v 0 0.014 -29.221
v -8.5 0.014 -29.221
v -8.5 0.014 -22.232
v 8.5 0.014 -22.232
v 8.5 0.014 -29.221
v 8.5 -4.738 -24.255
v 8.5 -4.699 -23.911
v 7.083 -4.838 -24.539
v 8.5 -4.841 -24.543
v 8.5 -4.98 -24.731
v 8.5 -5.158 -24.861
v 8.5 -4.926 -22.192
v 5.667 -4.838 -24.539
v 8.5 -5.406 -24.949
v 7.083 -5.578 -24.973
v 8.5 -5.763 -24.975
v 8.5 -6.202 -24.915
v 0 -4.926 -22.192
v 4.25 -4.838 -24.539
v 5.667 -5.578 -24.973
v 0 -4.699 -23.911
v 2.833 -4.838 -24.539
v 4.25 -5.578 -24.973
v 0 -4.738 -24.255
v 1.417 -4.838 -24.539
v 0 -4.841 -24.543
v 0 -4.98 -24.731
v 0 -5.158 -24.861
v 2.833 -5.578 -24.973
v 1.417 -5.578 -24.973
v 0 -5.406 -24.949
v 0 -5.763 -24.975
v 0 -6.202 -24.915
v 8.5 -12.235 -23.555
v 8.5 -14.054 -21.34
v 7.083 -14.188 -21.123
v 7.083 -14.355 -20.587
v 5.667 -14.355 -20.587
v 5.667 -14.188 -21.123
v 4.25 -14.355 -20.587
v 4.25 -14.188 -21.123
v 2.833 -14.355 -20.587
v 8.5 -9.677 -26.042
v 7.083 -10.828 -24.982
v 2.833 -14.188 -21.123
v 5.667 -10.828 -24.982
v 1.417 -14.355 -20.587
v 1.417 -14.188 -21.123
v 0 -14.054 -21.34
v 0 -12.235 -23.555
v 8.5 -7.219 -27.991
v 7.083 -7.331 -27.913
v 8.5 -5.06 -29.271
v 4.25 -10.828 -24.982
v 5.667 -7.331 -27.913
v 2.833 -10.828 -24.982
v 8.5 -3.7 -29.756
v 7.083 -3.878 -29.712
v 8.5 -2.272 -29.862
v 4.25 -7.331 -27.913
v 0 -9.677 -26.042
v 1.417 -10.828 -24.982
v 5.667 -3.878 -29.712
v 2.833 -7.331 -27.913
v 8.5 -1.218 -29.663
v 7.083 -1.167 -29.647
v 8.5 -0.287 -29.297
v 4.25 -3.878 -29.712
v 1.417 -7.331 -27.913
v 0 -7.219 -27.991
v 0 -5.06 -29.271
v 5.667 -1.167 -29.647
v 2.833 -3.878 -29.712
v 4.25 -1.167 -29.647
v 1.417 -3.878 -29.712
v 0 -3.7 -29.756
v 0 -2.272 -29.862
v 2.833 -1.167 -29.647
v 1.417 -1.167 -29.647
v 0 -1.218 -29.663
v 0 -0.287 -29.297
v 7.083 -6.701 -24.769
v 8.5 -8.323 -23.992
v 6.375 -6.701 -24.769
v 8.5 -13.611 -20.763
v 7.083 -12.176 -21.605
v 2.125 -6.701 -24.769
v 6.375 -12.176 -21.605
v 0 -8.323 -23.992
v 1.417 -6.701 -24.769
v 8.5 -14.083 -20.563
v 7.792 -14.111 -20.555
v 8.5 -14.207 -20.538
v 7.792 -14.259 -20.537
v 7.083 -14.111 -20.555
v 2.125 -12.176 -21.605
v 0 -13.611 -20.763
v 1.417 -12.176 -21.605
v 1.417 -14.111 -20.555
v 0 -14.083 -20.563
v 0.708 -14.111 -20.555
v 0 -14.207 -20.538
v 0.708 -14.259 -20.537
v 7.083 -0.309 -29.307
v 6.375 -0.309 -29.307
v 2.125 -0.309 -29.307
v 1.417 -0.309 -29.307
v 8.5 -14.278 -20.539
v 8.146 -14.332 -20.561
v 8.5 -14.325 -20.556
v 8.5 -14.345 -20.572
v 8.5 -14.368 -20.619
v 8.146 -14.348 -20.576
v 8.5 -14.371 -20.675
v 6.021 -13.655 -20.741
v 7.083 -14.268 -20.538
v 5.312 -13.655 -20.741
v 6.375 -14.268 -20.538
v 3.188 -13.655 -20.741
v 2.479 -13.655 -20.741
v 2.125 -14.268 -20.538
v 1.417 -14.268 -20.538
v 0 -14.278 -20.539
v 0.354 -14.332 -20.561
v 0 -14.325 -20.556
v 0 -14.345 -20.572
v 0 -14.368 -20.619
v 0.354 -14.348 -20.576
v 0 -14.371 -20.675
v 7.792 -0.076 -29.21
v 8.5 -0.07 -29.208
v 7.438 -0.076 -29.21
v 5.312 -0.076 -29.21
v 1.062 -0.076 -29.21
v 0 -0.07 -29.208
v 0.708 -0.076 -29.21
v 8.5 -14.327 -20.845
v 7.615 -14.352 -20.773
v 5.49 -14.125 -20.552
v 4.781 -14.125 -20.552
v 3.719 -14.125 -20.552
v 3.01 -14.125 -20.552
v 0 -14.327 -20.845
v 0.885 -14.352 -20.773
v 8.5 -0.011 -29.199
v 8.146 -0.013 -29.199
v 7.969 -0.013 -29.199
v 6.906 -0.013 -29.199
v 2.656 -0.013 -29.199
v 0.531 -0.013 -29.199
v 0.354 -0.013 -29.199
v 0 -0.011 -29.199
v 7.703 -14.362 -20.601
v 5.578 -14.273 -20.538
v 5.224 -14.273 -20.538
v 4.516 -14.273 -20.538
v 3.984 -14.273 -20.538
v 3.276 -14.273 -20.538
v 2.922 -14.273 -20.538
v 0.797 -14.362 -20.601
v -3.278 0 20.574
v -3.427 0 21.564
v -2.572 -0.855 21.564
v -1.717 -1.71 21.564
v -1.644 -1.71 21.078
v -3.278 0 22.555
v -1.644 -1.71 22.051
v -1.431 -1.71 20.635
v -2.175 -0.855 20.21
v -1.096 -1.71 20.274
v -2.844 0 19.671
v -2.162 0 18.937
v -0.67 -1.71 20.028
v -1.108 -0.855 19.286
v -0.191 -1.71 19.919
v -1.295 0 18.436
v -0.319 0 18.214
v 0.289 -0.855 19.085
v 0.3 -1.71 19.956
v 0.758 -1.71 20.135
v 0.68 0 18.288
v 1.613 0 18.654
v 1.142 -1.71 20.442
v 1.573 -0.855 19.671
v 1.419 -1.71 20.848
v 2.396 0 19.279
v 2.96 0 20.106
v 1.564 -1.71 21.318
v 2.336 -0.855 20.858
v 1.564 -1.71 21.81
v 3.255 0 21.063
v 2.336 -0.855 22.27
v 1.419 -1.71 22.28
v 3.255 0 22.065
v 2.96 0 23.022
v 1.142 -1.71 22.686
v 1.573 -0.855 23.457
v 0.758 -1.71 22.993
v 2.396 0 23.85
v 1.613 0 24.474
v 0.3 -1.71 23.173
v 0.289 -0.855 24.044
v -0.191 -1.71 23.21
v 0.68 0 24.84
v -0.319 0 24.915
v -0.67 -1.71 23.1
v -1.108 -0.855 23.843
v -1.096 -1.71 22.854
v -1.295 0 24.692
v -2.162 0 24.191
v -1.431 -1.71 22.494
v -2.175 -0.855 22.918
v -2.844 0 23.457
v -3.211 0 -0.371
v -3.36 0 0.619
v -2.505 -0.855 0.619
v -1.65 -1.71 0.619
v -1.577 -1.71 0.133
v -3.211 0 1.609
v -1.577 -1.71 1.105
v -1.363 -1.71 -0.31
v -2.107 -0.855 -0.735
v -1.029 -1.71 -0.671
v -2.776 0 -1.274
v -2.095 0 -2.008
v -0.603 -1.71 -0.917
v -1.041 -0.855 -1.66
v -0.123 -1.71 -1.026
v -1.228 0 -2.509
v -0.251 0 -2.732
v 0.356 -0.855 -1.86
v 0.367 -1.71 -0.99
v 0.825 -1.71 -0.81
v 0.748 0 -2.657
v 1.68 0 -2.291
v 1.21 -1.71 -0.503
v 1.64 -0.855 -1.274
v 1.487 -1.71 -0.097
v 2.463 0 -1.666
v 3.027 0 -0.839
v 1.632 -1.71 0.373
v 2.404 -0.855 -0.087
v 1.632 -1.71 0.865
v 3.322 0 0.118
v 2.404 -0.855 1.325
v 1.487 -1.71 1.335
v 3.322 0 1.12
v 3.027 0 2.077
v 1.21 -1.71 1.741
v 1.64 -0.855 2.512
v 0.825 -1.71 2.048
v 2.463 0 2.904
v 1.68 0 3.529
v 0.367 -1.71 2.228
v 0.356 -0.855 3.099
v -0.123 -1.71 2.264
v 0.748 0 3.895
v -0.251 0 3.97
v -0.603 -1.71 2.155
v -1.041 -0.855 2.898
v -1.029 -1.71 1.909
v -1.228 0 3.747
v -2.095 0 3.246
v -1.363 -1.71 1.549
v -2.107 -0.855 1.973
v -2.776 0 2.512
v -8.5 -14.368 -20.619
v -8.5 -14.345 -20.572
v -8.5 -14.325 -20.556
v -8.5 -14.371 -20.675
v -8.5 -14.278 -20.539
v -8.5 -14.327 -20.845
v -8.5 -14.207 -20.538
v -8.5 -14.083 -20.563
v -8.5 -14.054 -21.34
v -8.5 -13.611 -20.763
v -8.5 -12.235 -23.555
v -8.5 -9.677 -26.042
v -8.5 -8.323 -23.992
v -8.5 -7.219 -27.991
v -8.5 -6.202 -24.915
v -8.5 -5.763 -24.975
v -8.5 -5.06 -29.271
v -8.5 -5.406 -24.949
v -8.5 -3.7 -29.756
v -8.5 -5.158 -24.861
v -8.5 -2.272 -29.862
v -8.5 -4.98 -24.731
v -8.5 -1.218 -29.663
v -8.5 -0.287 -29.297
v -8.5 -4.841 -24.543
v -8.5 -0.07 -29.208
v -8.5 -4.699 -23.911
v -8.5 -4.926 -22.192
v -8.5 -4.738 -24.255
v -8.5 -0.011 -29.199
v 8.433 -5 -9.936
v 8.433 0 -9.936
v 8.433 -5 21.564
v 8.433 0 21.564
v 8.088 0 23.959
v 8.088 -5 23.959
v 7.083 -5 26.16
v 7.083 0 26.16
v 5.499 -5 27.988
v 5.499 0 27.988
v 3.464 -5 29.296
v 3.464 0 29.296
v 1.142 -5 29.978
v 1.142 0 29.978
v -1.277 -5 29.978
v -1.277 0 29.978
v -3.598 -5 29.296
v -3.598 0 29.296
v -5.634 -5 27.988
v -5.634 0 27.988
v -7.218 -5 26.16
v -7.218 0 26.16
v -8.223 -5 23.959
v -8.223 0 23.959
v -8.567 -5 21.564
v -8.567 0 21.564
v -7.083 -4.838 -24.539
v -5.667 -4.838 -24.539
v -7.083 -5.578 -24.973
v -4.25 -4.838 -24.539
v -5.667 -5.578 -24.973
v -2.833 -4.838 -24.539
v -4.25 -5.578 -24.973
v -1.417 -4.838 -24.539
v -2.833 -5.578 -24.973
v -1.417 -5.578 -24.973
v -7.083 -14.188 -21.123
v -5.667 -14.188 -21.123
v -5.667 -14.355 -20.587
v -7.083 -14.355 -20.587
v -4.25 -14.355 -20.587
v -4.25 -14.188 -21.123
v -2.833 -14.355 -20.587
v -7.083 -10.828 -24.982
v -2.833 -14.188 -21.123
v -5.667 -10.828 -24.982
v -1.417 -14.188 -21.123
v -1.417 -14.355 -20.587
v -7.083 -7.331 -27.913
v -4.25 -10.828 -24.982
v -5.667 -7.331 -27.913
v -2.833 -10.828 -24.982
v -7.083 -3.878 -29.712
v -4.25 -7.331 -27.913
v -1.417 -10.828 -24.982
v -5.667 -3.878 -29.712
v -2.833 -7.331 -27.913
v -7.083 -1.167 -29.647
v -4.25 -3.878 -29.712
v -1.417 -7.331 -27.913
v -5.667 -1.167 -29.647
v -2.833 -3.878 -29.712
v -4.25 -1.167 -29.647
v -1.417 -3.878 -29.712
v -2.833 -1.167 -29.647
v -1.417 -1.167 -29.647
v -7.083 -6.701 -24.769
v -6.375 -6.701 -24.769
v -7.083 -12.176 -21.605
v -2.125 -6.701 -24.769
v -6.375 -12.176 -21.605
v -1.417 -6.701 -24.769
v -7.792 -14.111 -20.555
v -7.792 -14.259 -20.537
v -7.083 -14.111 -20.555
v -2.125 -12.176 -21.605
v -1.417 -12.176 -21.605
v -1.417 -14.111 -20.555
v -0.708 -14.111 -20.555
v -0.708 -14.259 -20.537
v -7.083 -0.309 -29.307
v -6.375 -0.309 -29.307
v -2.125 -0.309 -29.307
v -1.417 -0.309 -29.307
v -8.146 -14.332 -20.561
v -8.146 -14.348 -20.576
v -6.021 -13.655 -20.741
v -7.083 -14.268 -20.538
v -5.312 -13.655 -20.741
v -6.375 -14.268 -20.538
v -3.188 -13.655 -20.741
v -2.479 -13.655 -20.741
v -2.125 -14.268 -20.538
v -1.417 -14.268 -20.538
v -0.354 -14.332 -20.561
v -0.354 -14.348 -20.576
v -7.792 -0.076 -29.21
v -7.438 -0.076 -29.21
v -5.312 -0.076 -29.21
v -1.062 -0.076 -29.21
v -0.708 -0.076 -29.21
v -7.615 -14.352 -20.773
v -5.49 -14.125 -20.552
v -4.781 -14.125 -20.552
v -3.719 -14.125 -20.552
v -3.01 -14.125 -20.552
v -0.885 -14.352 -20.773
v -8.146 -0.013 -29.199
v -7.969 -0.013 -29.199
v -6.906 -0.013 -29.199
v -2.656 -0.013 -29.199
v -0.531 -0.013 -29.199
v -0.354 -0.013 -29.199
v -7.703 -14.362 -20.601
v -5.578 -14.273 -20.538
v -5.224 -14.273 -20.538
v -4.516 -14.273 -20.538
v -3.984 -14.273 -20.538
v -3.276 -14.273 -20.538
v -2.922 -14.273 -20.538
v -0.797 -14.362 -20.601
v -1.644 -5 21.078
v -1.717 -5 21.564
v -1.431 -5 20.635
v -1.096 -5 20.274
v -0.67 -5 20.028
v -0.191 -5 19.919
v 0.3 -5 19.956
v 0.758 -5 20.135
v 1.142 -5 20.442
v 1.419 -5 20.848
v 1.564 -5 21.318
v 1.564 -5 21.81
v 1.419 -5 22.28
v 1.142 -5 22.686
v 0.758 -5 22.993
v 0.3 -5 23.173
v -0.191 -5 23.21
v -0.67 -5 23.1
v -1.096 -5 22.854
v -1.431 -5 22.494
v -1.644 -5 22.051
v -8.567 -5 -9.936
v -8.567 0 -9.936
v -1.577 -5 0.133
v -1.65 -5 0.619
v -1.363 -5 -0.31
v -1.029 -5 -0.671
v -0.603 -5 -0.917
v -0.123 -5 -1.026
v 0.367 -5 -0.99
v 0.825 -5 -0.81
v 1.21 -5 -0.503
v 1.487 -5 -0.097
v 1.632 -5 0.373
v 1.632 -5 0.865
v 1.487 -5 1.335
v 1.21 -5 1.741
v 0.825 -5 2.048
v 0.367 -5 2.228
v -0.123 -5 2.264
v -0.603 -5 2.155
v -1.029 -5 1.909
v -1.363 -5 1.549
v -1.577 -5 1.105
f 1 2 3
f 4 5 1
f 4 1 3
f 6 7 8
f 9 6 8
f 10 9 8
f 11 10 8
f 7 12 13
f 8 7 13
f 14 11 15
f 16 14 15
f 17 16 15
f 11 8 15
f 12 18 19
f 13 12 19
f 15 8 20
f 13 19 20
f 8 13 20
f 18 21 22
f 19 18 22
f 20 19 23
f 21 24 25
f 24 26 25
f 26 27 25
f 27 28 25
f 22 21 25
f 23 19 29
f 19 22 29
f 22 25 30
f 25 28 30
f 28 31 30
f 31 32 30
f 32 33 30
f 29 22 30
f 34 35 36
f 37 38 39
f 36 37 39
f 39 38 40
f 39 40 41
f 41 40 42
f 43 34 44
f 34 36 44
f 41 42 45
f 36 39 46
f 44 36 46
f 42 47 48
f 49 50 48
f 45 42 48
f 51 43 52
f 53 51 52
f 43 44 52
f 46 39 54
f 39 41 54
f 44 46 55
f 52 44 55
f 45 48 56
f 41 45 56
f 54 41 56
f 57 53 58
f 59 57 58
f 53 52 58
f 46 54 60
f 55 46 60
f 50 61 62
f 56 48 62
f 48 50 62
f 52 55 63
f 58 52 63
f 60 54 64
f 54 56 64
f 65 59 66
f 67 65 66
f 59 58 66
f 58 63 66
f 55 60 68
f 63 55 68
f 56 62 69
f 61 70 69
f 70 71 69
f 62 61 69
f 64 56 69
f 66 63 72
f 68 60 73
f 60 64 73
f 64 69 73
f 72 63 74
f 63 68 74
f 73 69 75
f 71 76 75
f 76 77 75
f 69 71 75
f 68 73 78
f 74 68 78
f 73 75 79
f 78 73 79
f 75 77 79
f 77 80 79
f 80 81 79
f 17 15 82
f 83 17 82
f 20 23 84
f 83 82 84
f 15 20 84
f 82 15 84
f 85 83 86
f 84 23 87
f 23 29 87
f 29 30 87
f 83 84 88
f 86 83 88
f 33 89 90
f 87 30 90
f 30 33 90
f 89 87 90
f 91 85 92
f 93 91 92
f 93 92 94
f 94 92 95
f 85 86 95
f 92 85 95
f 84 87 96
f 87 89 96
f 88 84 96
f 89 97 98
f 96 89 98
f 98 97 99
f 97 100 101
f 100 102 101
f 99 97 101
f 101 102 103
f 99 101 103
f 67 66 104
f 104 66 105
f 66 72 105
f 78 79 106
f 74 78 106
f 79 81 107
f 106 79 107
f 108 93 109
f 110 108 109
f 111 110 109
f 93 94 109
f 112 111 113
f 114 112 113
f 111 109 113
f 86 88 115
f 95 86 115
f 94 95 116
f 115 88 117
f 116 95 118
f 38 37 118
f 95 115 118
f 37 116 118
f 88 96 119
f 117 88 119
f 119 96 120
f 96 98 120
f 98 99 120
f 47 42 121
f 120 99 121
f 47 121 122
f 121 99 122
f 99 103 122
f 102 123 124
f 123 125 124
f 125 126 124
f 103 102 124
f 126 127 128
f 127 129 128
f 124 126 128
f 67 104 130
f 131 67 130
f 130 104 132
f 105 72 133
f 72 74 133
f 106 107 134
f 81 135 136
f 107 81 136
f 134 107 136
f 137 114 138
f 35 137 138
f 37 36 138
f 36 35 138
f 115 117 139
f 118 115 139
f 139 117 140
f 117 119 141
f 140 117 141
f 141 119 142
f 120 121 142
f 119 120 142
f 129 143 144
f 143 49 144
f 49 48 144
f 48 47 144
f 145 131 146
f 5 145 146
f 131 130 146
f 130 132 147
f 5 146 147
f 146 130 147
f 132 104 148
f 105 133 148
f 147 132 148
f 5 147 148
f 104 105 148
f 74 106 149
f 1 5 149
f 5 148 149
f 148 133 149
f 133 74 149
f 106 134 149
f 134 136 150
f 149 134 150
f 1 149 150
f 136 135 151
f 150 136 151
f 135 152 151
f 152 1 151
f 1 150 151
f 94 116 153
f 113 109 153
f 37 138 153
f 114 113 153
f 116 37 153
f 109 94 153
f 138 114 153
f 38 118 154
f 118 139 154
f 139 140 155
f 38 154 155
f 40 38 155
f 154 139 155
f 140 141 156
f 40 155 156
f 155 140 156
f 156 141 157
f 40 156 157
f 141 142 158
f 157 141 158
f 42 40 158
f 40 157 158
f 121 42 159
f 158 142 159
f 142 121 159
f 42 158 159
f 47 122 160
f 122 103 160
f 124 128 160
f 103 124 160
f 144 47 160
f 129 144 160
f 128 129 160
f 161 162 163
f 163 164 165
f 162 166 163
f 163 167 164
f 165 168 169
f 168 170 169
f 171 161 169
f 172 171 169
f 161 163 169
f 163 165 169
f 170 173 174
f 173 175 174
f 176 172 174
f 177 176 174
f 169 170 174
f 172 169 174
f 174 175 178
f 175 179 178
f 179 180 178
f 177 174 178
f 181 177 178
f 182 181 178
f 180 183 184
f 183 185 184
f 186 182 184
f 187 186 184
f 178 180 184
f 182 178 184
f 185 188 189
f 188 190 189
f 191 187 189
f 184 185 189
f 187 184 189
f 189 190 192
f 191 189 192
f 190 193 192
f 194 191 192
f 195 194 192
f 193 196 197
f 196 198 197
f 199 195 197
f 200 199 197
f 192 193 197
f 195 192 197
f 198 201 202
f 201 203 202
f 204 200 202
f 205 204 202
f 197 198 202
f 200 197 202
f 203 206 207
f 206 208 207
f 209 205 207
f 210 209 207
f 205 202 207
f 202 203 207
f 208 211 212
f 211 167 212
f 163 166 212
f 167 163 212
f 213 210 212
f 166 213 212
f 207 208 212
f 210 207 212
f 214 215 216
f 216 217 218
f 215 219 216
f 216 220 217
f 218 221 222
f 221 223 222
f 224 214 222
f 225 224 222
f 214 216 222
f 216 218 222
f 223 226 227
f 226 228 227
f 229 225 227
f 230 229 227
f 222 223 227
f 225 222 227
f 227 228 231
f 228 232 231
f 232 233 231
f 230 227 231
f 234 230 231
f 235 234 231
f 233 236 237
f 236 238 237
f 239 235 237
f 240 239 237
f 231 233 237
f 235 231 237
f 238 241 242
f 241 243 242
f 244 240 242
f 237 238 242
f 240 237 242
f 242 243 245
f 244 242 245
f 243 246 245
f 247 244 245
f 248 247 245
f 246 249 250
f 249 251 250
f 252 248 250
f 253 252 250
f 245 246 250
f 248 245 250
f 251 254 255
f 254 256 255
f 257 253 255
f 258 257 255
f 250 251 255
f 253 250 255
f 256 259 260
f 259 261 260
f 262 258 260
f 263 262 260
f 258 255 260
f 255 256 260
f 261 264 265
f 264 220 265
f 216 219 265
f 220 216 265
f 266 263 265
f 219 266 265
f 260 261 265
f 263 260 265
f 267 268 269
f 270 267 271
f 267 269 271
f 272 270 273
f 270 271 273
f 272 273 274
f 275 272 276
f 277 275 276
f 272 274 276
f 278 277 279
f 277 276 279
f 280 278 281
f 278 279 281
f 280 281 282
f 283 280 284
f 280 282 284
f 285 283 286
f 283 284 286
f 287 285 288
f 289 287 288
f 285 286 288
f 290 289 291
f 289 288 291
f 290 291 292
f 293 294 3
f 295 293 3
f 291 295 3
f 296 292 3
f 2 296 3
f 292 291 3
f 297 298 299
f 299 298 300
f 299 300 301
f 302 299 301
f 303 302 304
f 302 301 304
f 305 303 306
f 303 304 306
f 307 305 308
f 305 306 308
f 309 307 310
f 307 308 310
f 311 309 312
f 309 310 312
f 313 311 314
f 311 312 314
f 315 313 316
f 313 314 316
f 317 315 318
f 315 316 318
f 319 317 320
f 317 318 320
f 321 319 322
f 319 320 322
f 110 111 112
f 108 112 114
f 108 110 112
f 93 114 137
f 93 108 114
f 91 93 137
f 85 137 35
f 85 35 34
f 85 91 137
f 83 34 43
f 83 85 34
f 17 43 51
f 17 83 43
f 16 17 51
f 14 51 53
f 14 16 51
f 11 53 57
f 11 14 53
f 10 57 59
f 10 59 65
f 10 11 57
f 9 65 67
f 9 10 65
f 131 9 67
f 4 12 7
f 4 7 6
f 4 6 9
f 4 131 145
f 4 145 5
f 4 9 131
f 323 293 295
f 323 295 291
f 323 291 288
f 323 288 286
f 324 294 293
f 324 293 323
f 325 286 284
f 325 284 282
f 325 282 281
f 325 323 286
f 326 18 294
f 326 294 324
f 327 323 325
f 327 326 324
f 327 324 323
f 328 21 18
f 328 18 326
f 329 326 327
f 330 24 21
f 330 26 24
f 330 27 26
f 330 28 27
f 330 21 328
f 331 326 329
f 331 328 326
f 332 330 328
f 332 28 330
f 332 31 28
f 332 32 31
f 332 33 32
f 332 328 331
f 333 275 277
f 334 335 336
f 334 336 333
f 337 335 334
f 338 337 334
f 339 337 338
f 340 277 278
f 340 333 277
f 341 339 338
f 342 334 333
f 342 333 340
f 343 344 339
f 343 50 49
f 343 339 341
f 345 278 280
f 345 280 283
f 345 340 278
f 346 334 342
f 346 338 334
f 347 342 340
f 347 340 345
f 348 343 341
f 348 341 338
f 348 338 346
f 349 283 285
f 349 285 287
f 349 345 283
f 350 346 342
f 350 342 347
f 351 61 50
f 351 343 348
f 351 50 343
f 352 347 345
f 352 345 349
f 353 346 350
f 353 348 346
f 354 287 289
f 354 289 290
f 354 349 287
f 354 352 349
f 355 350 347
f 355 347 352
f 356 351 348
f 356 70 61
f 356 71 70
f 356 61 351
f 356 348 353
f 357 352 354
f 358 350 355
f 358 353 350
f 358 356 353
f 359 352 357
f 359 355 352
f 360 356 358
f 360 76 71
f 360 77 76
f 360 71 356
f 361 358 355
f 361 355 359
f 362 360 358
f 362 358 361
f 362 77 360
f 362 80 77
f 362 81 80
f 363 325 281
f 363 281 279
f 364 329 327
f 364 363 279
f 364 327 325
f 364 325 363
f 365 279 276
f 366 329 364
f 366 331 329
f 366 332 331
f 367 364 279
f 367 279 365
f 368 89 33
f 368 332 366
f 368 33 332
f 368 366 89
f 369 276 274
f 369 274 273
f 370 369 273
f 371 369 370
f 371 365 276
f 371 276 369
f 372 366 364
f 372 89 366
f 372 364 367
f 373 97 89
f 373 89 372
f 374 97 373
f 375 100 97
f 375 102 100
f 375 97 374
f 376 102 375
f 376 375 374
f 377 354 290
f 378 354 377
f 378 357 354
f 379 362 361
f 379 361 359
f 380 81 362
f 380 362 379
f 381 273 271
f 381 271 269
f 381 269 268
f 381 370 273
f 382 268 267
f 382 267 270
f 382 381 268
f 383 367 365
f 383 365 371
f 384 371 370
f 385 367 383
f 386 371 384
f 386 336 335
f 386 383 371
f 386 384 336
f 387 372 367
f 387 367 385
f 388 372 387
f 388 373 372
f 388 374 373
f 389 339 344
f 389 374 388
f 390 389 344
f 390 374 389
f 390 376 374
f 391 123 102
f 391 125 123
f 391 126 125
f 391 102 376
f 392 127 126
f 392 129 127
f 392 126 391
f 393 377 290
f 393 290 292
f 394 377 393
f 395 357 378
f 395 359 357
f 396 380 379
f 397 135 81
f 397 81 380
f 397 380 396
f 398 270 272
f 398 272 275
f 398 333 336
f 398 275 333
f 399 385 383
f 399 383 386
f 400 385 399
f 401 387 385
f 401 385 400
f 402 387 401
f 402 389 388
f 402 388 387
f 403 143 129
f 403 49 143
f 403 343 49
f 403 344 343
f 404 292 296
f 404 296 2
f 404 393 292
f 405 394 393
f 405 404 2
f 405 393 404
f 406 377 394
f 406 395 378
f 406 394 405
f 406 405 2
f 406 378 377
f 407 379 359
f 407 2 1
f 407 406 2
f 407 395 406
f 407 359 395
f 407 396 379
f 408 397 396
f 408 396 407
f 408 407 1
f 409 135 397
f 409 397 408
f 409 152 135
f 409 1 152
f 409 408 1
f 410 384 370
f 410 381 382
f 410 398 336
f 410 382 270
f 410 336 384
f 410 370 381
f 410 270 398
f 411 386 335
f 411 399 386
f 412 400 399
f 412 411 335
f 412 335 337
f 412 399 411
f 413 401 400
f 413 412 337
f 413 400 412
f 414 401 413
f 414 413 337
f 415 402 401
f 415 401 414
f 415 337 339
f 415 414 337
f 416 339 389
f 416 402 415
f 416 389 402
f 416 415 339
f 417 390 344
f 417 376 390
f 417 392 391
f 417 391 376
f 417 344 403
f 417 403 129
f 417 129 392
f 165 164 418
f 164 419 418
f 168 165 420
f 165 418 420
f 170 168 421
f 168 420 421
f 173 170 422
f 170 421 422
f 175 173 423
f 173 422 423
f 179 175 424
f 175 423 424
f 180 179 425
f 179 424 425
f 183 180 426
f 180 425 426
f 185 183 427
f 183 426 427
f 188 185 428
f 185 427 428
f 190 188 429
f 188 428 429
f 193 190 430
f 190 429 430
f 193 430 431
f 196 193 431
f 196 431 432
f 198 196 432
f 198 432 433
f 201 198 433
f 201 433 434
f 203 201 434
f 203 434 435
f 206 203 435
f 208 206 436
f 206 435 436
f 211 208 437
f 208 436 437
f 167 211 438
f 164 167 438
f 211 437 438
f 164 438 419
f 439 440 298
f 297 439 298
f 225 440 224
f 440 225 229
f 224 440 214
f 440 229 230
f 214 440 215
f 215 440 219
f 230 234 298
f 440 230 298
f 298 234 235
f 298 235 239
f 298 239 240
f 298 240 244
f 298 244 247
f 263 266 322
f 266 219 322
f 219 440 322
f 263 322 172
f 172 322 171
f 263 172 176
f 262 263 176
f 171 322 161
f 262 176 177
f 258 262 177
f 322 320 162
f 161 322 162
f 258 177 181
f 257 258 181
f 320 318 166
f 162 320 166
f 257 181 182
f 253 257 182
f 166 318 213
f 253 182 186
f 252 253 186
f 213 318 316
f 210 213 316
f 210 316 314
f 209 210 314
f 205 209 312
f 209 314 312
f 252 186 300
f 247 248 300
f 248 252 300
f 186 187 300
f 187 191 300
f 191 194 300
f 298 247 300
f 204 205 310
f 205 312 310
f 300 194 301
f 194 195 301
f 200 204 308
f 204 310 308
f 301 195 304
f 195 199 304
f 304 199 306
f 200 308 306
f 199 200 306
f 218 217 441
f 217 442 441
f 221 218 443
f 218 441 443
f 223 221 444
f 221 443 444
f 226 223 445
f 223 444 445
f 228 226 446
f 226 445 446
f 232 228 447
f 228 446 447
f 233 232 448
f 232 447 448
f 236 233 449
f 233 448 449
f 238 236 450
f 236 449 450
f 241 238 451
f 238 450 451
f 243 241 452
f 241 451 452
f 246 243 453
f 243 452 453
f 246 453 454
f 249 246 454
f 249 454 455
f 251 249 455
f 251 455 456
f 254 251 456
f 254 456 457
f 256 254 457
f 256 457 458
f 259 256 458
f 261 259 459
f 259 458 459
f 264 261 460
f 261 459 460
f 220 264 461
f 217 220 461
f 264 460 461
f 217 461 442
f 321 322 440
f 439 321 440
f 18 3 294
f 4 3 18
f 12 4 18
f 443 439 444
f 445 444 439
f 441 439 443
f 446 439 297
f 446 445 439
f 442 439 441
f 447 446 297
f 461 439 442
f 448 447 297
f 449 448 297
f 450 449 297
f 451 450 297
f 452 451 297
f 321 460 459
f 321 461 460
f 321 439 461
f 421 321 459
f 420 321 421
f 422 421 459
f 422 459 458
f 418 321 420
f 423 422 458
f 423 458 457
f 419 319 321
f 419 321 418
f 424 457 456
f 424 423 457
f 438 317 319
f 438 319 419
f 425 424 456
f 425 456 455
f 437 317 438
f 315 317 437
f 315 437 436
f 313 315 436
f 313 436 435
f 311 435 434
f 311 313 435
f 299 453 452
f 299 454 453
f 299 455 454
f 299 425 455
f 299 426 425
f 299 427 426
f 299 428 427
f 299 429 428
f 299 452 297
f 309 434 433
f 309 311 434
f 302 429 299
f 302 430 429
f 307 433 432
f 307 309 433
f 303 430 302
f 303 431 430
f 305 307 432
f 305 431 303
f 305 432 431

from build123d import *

# Parameters (mm, degrees)
F1_DEPTH       = 5
F3_DEPTH       = 8.5
F4_D           = 3.3
F4_CSINK_D     = 6.72
F4_CSINK_ANGLE = 90


with BuildPart() as f1:
    # F0 (on Front) → F1 (new body)
    with BuildSketch(Plane.XZ):
        with BuildLine():
            ThreePointArc((8.4325509294, 21.5641788055), (-0.0674490706, 30.0641788055), (-8.5674490706, 21.5641788055))
            Line((-8.5674490706, 21.5641788055), (-8.5674490706, -9.9358211945))
            Line((-8.5674490706, -9.9358211945), (8.4325509294, -9.9358211945))
            Line((8.4325509294, -9.9358211945), (8.4325509294, 21.5641788055))
        make_face()
    extrude(amount=F1_DEPTH)

    # F4 (through all)
    with Locations(Plane(origin=(0, 0, 0), x_dir=(1, 0, 0), z_dir=(0, 1, 0))):
        with Locations((0, -0.6190594286), (-0.0674490706, -21.5641788055)):
            CounterSinkHole(F4_D / 2, F4_CSINK_D / 2, counter_sink_angle=F4_CSINK_ANGLE)


with BuildPart() as f3:
    # F2 (on Right) → F3 (new body, symmetric)
    with BuildSketch(Plane.YZ):
        with BuildLine():
            Line((0.013565836, -22.2315713763), (-4.9255341291, -22.1924073994))
            add(Edge.make_bspline(
                [(-4.9255341291, -22.1924073994), (-4.7449644372, -23.1077914368), (-4.3885025253, -24.914855866), (-7.1527987917, -25.4021910895), (-19.9273497333, -15.5434690169), (-4.5023920771, -32.5137191407), (-0.0885803837, -29.0693910148), (0.0112932377, -29.2125822191), (0.013565836, -29.2206046382)],
                knots=[0, 0, 0, 0, 0.1281220998, 0.2529263302, 0.4943221397, 0.8059857979, 0.971340208, 0.9787578336, 0.9787578336, 0.9787578336, 0.9787578336], degree=3))
            Line((0.013565836, -29.2206046382), (0.013565836, -22.2315713763))
        make_face()
    extrude(amount=F3_DEPTH, both=True)


solid = Compound([f1.part, f3.part])
